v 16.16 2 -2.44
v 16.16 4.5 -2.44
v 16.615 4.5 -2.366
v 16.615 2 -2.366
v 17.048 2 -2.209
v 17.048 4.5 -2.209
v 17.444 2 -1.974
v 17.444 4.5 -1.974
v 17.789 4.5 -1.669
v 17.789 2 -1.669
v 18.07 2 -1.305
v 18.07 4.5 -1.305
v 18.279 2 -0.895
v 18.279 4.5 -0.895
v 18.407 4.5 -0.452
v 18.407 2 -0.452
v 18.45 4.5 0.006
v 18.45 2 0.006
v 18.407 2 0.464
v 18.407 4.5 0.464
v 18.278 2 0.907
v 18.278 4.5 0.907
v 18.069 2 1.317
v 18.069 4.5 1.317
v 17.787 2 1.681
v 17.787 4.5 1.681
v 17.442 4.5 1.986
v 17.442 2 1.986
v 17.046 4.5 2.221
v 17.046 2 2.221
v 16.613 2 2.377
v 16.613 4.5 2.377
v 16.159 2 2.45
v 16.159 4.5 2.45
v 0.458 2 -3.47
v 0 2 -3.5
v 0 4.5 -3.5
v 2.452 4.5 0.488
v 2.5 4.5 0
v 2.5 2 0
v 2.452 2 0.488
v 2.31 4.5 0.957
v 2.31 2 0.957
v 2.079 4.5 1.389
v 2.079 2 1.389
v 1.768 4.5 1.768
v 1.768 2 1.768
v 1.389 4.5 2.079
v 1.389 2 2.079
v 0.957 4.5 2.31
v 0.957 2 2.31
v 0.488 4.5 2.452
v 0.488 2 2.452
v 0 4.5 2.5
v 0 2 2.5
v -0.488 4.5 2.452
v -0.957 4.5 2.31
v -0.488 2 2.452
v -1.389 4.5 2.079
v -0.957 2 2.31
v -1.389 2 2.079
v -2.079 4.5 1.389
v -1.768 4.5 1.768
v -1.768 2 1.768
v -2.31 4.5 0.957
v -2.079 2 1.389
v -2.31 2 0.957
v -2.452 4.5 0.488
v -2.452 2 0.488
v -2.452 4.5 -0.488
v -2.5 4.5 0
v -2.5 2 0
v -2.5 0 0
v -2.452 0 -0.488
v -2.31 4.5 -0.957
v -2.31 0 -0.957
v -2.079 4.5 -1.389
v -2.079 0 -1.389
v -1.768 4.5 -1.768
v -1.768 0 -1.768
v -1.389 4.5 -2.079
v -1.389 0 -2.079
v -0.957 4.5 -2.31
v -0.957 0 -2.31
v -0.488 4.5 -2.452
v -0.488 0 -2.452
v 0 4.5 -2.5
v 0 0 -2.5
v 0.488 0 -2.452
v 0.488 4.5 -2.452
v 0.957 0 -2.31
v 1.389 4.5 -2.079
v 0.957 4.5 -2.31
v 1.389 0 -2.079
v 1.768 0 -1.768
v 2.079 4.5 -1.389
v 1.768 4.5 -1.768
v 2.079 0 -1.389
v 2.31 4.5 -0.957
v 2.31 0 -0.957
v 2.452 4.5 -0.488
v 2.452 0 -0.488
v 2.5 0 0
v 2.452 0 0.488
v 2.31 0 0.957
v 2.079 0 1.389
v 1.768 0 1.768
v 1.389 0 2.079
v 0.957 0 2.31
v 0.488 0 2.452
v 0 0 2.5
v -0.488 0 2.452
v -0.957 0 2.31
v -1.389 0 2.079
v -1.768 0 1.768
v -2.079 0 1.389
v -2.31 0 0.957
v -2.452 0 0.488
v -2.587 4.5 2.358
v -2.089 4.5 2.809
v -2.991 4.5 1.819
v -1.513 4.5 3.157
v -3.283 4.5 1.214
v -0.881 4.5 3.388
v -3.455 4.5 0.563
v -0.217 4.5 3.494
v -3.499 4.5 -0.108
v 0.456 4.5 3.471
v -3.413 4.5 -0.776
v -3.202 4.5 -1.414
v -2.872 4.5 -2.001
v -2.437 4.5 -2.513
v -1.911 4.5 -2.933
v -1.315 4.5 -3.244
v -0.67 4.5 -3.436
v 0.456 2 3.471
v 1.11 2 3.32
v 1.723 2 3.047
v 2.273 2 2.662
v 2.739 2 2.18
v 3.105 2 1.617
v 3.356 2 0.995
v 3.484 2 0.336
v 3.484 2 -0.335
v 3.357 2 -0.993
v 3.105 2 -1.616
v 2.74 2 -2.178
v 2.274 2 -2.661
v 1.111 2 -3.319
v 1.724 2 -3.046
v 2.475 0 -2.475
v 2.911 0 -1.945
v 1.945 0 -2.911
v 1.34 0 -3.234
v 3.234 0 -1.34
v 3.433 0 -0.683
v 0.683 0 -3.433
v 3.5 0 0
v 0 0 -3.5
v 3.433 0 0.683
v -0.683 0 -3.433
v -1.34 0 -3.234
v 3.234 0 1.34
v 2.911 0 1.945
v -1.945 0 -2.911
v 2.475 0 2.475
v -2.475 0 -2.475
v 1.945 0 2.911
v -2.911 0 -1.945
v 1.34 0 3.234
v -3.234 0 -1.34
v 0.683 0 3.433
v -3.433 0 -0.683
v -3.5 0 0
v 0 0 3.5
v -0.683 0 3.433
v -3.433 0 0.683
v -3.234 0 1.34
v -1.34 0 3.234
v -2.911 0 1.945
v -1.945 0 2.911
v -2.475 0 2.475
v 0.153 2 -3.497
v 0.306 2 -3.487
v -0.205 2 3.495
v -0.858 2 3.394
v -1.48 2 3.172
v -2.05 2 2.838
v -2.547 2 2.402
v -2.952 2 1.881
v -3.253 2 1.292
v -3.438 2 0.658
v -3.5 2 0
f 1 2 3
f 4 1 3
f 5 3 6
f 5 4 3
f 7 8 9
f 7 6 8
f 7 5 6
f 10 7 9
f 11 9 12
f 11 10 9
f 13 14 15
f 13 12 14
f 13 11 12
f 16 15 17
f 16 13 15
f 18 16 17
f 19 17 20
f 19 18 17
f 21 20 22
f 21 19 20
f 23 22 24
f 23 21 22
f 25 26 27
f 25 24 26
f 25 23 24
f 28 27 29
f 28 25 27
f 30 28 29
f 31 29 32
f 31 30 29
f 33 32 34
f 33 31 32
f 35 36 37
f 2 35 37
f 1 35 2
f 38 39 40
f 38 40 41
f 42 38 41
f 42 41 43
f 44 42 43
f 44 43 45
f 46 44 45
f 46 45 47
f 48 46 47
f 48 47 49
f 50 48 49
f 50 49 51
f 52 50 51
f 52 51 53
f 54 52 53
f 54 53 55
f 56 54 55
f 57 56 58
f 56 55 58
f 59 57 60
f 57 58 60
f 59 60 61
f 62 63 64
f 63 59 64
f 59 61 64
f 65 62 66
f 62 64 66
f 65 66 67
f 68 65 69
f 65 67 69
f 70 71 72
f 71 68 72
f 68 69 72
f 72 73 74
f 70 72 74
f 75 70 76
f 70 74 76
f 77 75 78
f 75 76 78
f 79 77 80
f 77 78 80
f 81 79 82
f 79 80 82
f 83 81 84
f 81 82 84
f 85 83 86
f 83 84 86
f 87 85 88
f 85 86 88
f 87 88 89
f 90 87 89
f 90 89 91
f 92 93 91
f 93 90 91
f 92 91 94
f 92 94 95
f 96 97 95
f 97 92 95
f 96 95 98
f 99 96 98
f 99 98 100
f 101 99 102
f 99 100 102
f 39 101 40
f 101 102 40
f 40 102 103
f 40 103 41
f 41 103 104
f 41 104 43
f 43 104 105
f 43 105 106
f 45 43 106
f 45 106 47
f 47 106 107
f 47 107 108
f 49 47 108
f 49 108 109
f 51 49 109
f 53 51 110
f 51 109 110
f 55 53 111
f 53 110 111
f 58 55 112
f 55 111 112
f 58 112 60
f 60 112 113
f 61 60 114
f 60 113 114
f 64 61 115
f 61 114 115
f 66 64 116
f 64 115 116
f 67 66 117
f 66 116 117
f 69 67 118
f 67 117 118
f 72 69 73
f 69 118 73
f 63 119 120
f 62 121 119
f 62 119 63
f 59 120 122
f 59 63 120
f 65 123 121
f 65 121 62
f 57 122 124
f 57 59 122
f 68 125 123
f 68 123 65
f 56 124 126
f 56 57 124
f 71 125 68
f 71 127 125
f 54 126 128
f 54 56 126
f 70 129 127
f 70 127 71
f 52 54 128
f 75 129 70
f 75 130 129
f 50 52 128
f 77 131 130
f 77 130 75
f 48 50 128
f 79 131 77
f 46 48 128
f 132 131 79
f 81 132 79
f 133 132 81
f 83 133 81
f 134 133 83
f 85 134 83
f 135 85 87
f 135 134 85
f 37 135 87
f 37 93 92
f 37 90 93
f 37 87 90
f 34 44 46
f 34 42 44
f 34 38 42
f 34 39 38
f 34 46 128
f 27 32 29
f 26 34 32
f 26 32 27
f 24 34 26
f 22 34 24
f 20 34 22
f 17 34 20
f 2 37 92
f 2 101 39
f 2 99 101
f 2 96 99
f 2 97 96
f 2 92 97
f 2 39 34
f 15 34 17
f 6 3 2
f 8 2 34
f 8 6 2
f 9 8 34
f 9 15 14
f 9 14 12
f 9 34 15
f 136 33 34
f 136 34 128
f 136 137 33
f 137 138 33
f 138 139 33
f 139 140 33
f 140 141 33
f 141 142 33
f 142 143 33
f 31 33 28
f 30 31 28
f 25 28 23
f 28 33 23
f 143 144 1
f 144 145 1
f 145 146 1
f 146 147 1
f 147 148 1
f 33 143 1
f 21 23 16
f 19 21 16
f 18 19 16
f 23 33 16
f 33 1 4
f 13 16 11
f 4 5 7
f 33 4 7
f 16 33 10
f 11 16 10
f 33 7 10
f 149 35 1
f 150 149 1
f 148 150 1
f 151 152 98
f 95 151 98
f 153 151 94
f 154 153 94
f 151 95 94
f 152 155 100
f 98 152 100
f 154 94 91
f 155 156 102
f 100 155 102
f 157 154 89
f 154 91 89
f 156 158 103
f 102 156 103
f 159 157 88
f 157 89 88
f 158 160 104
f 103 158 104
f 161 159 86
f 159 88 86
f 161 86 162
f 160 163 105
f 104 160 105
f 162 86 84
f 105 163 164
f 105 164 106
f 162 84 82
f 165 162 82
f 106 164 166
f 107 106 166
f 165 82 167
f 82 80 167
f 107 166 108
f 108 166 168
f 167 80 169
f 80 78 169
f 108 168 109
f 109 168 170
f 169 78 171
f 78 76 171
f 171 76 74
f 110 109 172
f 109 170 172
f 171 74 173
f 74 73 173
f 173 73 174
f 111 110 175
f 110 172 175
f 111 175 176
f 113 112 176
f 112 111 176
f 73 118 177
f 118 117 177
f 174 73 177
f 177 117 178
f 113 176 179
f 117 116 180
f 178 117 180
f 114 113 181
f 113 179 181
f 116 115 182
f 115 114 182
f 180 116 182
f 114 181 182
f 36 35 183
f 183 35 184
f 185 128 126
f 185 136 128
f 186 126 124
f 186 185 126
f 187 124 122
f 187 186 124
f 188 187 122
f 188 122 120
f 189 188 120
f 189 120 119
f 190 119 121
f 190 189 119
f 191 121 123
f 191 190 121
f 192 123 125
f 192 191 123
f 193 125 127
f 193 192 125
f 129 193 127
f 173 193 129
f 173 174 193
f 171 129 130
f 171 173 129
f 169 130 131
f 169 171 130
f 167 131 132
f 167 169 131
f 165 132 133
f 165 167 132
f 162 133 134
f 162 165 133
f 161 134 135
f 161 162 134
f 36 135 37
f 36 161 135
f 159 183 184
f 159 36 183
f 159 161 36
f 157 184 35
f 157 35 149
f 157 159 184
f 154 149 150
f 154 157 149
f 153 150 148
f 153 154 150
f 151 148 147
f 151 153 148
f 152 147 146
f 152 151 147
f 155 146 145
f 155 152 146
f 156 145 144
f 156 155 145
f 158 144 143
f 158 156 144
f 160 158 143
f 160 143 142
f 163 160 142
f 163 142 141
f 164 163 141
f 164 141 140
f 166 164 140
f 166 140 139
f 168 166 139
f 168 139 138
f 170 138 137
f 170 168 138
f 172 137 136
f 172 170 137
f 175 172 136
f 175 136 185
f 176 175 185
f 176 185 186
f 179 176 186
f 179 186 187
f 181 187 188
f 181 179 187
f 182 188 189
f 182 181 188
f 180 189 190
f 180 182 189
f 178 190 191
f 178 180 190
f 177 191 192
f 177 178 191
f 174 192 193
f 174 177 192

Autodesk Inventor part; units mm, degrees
ref_plane "YZ Plane" through (0, 0, 0) normal (1, 0, 0) x (0, 1, 0)
ref_plane "XZ Plane" through (0, 0, 0) normal (0, 1, 0) x (-1, 0, 0)
sketch "Sketch1" plane through (0, 0, 0) normal (0, 1, 0) x (-1, 0, 0)
  circle A0 centre (0, 0) radius 3.5005
  circle A1 centre (0, 0) radius 2.5
  dimension "d0" = 7.001
  dimension "d1" = 5.0001
extrude "Extrusion1" add sketch "Sketch1" along normal blind 2
ref_plane "Work Plane1" through (0, 2, 0) normal (0, 1, 0) x (1, 0, 0)
sketch "Sketch2" plane through (0, 2, 0) normal (0, 1, 0) x (1, 0, 0)
  arc A0 (0.2288, 3.4855) -> (0.2265, -3.4856) centre (0, 0) ccw
  arc A1 (16.1589, -2.4501) -> (16.1605, 2.4395) centre (16, -0.0053) ccw
  circle A2 centre (0, 0) radius 3.5005 projected
  line L0 (0, 3.5005) -> (16.1605, 2.4395)
  line L1 (16.1589, -2.4501) -> (0.2265, -3.4856)
  circle A3 centre (0, 0) radius 2.5 projected
  circle A4 centre (0, 0) radius 2.5
  dimension "d5" = 4.9
  dimension "d6" = 16
extrude "Extrusion2" add sketch "Sketch2" along normal blind 2.5 contours L0 A2 L1 A0 | A0 L1 A2 L0 | L0 A1 L1 A2
properties part number "eje de motor"
